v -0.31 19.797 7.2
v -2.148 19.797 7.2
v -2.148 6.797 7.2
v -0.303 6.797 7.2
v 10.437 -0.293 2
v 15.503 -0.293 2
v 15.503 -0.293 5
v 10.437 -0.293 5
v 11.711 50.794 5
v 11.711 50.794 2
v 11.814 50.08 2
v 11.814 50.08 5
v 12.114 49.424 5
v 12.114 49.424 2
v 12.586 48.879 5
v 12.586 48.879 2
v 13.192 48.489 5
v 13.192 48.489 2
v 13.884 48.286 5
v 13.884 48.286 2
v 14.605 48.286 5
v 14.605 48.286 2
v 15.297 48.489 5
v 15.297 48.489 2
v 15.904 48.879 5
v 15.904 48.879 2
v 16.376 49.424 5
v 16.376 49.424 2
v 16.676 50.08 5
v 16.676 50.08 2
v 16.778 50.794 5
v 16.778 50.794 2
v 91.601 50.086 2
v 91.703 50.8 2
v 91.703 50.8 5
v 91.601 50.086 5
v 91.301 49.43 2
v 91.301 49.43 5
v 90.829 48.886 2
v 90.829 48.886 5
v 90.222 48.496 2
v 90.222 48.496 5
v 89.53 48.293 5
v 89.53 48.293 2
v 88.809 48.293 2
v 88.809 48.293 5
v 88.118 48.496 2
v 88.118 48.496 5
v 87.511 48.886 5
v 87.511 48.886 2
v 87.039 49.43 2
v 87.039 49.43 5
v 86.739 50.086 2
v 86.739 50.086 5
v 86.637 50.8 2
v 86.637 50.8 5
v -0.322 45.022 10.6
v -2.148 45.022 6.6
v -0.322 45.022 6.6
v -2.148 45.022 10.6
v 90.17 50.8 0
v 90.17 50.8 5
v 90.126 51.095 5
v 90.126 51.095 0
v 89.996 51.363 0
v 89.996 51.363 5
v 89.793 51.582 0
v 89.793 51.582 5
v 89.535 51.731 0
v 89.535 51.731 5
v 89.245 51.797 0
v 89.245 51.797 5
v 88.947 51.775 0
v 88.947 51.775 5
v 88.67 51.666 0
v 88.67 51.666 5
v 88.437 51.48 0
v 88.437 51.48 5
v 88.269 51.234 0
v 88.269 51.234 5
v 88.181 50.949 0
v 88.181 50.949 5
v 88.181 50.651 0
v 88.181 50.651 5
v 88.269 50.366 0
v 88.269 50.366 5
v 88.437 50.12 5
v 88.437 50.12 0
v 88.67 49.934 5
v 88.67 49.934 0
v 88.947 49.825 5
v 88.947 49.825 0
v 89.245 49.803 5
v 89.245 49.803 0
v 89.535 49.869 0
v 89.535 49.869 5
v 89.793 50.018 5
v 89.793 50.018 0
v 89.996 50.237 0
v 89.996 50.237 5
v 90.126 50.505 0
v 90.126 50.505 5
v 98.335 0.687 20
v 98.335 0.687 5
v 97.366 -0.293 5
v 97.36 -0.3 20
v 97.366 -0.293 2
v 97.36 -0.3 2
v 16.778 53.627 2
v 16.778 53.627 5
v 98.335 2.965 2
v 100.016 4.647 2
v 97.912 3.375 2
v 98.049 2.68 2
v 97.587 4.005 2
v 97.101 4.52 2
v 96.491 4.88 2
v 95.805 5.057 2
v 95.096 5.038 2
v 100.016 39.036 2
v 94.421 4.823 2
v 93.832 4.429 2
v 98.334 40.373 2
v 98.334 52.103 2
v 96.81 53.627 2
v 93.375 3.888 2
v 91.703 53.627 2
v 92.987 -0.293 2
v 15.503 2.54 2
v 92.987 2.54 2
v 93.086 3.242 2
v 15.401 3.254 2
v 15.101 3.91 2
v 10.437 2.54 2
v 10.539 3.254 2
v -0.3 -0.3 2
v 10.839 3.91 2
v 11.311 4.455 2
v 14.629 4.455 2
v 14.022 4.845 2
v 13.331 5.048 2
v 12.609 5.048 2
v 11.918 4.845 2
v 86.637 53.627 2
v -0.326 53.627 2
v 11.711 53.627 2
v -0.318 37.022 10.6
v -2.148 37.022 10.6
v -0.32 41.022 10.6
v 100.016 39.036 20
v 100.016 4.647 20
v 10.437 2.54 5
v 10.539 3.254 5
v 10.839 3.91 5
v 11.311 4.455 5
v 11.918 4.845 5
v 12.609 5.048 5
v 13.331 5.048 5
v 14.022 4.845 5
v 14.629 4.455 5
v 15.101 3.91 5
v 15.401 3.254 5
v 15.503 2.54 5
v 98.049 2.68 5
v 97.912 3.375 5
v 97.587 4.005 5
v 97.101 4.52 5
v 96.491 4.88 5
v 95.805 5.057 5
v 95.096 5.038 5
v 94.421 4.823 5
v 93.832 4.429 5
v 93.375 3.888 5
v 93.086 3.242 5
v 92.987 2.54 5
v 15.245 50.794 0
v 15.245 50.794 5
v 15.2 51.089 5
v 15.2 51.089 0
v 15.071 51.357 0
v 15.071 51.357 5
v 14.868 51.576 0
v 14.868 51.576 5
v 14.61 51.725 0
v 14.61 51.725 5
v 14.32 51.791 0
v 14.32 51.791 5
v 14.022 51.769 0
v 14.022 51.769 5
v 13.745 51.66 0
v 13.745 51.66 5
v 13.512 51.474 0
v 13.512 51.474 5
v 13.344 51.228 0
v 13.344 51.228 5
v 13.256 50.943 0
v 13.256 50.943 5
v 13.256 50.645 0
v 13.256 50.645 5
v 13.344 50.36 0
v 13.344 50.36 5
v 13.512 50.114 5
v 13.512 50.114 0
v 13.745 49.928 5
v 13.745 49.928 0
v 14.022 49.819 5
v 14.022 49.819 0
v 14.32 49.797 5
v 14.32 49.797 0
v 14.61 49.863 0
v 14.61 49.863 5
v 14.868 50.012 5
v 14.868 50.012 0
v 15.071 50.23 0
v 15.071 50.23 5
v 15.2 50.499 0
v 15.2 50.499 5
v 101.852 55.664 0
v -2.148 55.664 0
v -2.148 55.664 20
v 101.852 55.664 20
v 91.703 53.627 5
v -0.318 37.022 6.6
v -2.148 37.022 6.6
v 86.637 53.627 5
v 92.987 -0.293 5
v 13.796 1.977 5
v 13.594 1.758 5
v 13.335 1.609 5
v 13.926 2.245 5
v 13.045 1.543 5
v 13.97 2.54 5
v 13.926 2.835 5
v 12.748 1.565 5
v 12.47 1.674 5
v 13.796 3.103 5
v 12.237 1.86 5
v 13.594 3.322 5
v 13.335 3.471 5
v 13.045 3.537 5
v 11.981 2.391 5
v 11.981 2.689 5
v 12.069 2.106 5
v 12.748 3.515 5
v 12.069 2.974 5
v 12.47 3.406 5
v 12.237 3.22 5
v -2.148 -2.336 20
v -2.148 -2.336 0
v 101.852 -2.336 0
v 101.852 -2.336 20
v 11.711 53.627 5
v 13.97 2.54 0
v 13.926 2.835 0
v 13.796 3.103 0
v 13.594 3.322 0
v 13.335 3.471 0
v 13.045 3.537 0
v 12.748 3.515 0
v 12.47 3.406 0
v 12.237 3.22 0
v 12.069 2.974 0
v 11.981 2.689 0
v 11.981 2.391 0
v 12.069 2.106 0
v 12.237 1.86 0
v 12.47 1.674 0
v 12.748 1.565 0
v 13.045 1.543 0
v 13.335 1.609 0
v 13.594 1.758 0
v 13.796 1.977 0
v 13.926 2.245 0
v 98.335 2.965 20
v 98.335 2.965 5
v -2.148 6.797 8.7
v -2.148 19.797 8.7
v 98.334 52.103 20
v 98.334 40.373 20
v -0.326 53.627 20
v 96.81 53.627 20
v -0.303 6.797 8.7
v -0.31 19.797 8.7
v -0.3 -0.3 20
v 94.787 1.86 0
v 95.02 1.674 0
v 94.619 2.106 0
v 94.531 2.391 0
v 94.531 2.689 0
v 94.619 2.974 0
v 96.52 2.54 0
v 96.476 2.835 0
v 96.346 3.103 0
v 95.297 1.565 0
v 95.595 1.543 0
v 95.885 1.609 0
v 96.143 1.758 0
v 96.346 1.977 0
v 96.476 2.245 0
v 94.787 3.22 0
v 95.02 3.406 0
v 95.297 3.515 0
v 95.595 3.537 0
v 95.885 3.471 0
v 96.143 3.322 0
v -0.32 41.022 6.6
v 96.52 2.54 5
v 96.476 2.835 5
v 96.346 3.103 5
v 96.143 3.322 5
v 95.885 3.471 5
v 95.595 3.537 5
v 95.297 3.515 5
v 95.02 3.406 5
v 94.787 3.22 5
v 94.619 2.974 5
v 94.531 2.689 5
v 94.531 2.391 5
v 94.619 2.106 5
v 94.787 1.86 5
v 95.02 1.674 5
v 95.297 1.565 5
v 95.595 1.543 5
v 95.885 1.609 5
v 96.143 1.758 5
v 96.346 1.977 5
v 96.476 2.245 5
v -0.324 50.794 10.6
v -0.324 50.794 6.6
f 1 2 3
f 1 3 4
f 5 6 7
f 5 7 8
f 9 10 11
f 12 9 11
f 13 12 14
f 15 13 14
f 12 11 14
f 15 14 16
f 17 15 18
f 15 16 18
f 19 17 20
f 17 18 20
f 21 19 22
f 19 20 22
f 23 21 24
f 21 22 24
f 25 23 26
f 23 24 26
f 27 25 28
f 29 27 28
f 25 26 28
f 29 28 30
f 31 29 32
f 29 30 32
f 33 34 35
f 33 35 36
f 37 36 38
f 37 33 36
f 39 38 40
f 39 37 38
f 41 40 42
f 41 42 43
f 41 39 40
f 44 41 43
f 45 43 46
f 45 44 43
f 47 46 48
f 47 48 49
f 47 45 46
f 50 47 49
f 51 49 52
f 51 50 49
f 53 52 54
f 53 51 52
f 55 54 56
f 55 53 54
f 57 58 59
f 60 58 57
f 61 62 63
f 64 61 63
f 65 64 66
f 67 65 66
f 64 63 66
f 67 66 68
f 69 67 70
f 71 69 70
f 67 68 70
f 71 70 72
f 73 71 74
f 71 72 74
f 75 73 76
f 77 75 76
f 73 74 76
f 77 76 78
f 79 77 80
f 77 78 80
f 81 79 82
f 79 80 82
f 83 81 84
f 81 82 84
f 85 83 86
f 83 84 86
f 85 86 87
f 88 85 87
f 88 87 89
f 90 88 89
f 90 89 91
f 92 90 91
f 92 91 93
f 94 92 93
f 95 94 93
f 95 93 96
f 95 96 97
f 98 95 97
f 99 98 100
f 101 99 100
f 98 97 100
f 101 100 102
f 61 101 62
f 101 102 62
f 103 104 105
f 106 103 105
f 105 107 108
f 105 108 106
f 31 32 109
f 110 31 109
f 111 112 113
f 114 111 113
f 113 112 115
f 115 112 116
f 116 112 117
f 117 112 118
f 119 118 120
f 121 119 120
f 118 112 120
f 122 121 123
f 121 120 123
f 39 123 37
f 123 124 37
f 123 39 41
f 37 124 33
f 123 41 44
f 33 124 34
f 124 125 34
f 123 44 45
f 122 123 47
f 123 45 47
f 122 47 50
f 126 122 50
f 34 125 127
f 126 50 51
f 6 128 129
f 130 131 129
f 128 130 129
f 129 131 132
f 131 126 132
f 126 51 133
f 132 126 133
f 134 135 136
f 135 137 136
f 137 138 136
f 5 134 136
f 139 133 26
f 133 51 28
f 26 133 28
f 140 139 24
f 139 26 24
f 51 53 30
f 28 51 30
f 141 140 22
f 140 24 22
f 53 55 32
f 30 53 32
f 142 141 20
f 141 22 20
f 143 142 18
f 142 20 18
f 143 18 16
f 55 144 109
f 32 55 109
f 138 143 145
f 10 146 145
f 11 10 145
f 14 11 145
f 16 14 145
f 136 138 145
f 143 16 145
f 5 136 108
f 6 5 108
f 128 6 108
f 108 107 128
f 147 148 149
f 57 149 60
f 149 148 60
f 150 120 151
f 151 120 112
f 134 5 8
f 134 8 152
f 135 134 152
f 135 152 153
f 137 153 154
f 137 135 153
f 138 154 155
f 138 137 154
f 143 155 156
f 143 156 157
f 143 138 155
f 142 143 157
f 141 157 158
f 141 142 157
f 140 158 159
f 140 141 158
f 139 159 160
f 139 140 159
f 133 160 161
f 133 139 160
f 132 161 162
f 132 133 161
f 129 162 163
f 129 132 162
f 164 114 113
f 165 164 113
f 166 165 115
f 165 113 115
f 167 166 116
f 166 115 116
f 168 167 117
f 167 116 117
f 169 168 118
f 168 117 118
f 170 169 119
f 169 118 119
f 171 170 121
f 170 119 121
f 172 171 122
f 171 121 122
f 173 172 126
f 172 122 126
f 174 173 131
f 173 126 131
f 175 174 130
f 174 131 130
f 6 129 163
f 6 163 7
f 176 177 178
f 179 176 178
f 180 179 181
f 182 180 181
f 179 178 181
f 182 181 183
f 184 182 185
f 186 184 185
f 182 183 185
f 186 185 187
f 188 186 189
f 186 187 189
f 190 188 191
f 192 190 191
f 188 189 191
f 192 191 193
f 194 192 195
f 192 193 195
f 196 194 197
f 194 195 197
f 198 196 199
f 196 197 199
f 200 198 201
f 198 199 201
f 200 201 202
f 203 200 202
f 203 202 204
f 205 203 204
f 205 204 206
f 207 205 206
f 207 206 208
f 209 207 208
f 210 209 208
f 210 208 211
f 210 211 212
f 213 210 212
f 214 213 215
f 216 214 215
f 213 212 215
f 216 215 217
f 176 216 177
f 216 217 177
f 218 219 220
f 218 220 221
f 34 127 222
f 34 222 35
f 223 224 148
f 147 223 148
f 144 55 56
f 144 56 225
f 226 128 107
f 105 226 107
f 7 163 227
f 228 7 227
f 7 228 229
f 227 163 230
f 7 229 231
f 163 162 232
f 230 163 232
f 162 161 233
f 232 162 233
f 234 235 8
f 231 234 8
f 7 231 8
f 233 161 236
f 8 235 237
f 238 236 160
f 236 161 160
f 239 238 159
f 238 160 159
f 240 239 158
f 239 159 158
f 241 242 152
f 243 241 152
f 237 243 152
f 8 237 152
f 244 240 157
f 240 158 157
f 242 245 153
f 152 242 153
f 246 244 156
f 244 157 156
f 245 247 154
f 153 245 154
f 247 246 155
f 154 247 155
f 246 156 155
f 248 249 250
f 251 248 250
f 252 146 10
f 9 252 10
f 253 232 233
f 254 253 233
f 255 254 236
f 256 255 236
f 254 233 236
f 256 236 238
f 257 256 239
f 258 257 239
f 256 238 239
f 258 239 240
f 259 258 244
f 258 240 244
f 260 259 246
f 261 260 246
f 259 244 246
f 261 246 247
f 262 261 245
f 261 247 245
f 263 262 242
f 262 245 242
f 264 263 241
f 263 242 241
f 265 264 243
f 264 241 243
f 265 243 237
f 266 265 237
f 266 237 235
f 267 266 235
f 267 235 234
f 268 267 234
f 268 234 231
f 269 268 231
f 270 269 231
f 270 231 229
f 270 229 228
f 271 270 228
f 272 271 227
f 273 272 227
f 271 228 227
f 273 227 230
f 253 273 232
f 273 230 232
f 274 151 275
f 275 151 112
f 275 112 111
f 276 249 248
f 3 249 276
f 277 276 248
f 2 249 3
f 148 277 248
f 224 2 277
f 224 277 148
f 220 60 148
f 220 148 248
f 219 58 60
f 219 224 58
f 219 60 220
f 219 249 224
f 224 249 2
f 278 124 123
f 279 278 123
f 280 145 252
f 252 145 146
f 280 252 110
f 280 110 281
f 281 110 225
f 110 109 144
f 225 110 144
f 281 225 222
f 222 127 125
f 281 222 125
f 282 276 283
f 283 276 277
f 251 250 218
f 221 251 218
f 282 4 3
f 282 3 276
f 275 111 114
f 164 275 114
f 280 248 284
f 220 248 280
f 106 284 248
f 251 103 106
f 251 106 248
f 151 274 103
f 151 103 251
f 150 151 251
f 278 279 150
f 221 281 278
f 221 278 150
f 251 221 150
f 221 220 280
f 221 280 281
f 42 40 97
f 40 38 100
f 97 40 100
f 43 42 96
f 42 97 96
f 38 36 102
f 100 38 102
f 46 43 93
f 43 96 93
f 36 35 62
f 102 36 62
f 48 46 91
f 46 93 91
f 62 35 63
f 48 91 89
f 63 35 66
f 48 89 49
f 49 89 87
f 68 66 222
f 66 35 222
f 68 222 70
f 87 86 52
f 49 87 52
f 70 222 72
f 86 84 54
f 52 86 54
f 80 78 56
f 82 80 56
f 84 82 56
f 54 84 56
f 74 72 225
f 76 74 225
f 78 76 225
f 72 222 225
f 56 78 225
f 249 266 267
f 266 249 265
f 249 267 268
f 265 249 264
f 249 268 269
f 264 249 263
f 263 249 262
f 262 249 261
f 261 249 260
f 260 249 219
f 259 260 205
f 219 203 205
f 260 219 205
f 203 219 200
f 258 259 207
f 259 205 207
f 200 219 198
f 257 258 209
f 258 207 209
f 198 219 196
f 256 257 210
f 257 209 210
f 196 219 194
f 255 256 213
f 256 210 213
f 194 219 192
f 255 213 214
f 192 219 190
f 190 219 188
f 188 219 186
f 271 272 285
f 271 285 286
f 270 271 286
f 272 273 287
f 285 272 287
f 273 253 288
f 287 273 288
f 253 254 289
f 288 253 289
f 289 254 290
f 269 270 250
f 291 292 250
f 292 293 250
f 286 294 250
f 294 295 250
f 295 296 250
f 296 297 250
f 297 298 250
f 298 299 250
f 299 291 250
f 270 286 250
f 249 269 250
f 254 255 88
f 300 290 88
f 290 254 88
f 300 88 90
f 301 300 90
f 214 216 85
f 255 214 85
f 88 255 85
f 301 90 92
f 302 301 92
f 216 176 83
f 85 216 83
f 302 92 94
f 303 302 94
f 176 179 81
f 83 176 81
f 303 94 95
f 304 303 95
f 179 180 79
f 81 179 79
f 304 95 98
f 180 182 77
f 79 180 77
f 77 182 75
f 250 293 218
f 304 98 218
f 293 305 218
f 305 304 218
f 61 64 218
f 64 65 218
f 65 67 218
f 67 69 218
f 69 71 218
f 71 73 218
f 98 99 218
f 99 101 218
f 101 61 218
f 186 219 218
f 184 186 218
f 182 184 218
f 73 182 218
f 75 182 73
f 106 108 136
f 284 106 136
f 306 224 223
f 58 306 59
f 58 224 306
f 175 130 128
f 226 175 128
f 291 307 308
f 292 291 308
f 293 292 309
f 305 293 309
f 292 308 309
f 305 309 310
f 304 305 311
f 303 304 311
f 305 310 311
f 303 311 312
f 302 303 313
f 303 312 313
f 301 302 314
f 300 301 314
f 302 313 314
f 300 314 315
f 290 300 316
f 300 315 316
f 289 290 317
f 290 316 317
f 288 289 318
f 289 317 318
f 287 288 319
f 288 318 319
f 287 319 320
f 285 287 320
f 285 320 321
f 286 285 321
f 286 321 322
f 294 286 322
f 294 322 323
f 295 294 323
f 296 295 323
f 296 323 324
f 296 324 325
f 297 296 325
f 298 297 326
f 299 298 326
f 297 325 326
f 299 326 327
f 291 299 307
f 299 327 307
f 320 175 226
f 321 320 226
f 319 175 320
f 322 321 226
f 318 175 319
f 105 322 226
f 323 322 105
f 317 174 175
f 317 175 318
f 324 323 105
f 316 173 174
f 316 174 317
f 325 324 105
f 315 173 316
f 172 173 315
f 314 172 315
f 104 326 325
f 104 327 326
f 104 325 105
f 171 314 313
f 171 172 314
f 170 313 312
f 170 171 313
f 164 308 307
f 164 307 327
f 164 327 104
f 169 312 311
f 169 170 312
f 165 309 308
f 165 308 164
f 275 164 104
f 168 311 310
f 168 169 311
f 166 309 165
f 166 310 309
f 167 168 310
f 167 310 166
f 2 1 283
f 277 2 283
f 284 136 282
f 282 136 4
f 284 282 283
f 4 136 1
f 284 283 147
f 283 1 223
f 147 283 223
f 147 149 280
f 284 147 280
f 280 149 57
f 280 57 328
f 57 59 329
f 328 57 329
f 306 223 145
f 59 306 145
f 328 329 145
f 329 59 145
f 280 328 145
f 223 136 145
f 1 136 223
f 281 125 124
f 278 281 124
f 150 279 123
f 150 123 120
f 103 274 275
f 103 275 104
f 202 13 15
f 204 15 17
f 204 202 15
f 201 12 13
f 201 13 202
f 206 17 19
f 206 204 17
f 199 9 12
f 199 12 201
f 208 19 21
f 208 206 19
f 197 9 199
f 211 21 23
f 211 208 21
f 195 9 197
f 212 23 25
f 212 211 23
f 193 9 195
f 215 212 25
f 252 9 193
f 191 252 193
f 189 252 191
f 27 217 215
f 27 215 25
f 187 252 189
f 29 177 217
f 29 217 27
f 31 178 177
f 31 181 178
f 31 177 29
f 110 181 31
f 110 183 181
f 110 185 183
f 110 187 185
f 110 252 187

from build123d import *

# Parameters (mm, degrees)
SKETCH_3_W               = 104
SKETCH_3_H               = 58
EXTRUDE_1_DEPTH          = 20
SKETCH_3_R               = 1.5
EXTRUDE_1_2_DEPTH        = 20
EXTRUDE_1_3_DEPTH        = 20
EXTRUDE_1_4_DEPTH        = 20
EXTRUDE_1_5_DEPTH        = 20
SKETCH_4_W               = 104
SKETCH_4_H               = 58
EXTRUDE_2_DEPTH          = 2
EXTRUDE_3_DEPTH          = 3
CUT_EXTRUDE_1_DEPTH      = 118.034964822
CUT_EXTRUDE_1_DEPTH_BACK = 118.034964822
SKETCH_6_R               = 1.5
SKETCH_7_R               = 1.6263635
SKETCH_7_R_2             = 1
EXTRUDE_4_DEPTH          = 5
SKETCH_8_W               = 4
SKETCH_8_H               = 10
CUT_EXTRUDE_2_DEPTH      = 1.274832
SKETCH_9_W               = 4
SKETCH_9_H               = 8
EXTRUDE_5_DEPTH          = 4
SKETCH_11_W              = 4
SKETCH_11_H              = 5.77137
EXTRUDE_7_DEPTH          = 1.82408674
CUT_EXTRUDE_3_REACH      = 123.535
SKETCH_13_W              = 4
SKETCH_13_H              = 8
SKETCH_14_W              = 2
SKETCH_14_H              = 13
EXTRUDE_8_DEPTH          = 2.2
CUT_EXTRUDE_4_REACH      = 123.385
SKETCH_15_W              = 1.5
SKETCH_15_H              = 13
SKETCH_16_W              = 7.456454352
SKETCH_16_H              = 15.223594302
CUT_EXTRUDE_5_DEPTH      = 2


with BuildPart() as part:
    # 草图3 → 凸台-拉伸1 (new body)
    with BuildSketch(Plane.XY):
        with Locations((49.851592, 26.6635985)):
            Rectangle(SKETCH_3_W, SKETCH_3_H)
        Polygon((97.359934, -0.3), (-0.3, -0.3), (-0.32567, 53.627197), (96.810253, 53.627197), (98.334256, 52.103194), (98.334256, 40.373171), (100.016019, 39.036416919), (100.016019, 4.64681), (98.334516, 2.965177), (98.334516, 0.686792), align=None, mode=Mode.SUBTRACT)
    extrude(amount=EXTRUDE_1_DEPTH)



with BuildPart() as body_2:
    # 草图3 → Extrude 1 2 (new body)
    with BuildSketch(Plane.XY):
        with Locations((89.1699285, 50.800132)):
            Circle(SKETCH_3_R)
    extrude(amount=EXTRUDE_1_2_DEPTH)


with BuildPart() as body_3:
    # 草图3 → Extrude 1 3 (new body)
    with BuildSketch(Plane.XY):
        with Locations((95.519941, 2.540035)):
            Circle(SKETCH_3_R)
    extrude(amount=EXTRUDE_1_3_DEPTH)


with BuildPart() as body_4:
    # 草图3 → Extrude 1 4 (new body)
    with BuildSketch(Plane.XY):
        with Locations((12.970026, 2.540035)):
            Circle(SKETCH_3_R)
    extrude(amount=EXTRUDE_1_4_DEPTH)


with BuildPart() as body_5:
    # 草图3 → Extrude 1 5 (new body)
    with BuildSketch(Plane.XY):
        with Locations((14.2448585, 50.793782)):
            Circle(SKETCH_3_R)
    extrude(amount=EXTRUDE_1_5_DEPTH)


with BuildPart() as part_1:
    add(part.part)

    add(body_2.part)  # 凸台-拉伸2 merges body 2

    add(body_3.part)  # 凸台-拉伸2 merges body 3

    add(body_4.part)  # 凸台-拉伸2 merges body 4

    add(body_5.part)  # 凸台-拉伸2 merges body 5
    # 草图4 → 凸台-拉伸2 (add)
    with BuildSketch(Plane(origin=(0, 0, 0), x_dir=(-1, 0, 0), z_dir=(0, 0, -1))):
        with Locations((-49.851592, 26.6635985)):
            Rectangle(SKETCH_4_W, SKETCH_4_H)
    extrude(amount=-EXTRUDE_2_DEPTH)

    # 草图5 → 凸台-拉伸3 (add)
    with BuildSketch(Plane.XY.offset(2)):
        with BuildLine():
            Line((16.7782735, 50.793782), (16.7782735, 53.627197))
            Line((16.7782735, 53.627197), (11.7114435, 53.627197))
            Line((11.7114435, 53.627197), (11.7114435, 50.793782))
            ThreePointArc((11.7114435, 50.793782), (14.2448585, 48.260367), (16.7782735, 50.793782))
        make_face()
        with BuildLine():
            Line((86.6365135, 50.800132), (86.6365135, 53.633547))
            Line((86.6365135, 53.633547), (91.7033435, 53.633547))
            Line((91.7033435, 53.633547), (91.7033435, 50.800132))
            ThreePointArc((91.7033435, 50.800132), (89.1699285, 48.266717), (86.6365135, 50.800132))
        make_face()
        with BuildLine():
            Line((15.503441, 2.540035), (15.503441, -0.29338))
            Line((15.503441, -0.29338), (10.436611, -0.29338))
            Line((10.436611, -0.29338), (10.436611, 2.540035))
            ThreePointArc((10.436611, 2.540035), (12.970026, 5.07345), (15.503441, 2.540035))
        make_face()
        with BuildLine():
            Line((92.986526, -0.29338), (98.053356, -0.29338))
            Line((98.053356, -0.29338), (98.605799849, -0.29338))
            Line((98.605799849, -0.29338), (100.016019, 4.64681))
            Line((100.016019, 4.64681), (98.334516, 2.965177))
            Line((98.334516, 2.965177), (98.049480092, 2.680119056))
            ThreePointArc((98.049480092, 2.680119056), (95.449872167, 5.072480838), (92.986526, 2.540035))
            Line((92.986526, 2.540035), (92.986526, -0.29338))
        make_face()
    extrude(amount=EXTRUDE_3_DEPTH)

    # 草图6 → 切除-拉伸1 (cut, two sides: drawn at the far end of the back side and taken through both)
    with BuildSketch(Plane.XY.offset(5).offset(-CUT_EXTRUDE_1_DEPTH_BACK)):
        with Locations((14.2448585, 50.793782)):
            Circle(SKETCH_6_R)
        with Locations((89.1699285, 50.800132)):
            Circle(SKETCH_6_R)
        with Locations((12.970026, 2.540035)):
            Circle(SKETCH_6_R)
        with Locations((95.519941, 2.540035)):
            Circle(SKETCH_6_R)
    extrude(amount=CUT_EXTRUDE_1_DEPTH + CUT_EXTRUDE_1_DEPTH_BACK, mode=Mode.SUBTRACT)

    # 草图7 → 凸台-拉伸4 (add)
    # profile 1 of 4: a face of its own
    with BuildSketch(Plane.XY.offset(5)):
        with Locations((14.2448585, 50.793782)):
            Circle(SKETCH_7_R)
        with Locations((14.2448585, 50.793782)):
            Circle(SKETCH_7_R_2, mode=Mode.SUBTRACT)
    # profile 2 of 4: a face of its own
    with BuildSketch(Plane.XY.offset(5)):
        with Locations((89.1699285, 50.800132)):
            Circle(SKETCH_7_R)
        with Locations((89.1699285, 50.800132)):
            Circle(SKETCH_7_R_2, mode=Mode.SUBTRACT)
    # profile 3 of 4: a face of its own
    with BuildSketch(Plane.XY.offset(5)):
        with Locations((95.519941, 2.540035)):
            Circle(SKETCH_7_R)
        with Locations((95.519941, 2.540035)):
            Circle(SKETCH_7_R_2, mode=Mode.SUBTRACT)
    # profile 4 of 4: a face of its own
    with BuildSketch(Plane.XY.offset(5)):
        with Locations((12.970026, 2.540035)):
            Circle(SKETCH_7_R)
        with Locations((12.970026, 2.540035)):
            Circle(SKETCH_7_R_2, mode=Mode.SUBTRACT)
    extrude(amount=-EXTRUDE_4_DEPTH)

    # 草图8 → 切除-拉伸2 (cut)
    with BuildSketch(Plane(origin=(16.7782735, 0, 0), x_dir=(0, 0, -1), z_dir=(1, 0, 0))):
        with Locations((-8.6, 45.793782)):
            Rectangle(SKETCH_8_W, SKETCH_8_H)
    extrude(amount=-CUT_EXTRUDE_2_DEPTH, mode=Mode.SUBTRACT)

    # 草图9 → 凸台-拉伸5 (add)
    with BuildSketch(Plane.XY.offset(6.6)):
        with Locations((-2.319669969, 41.022412)):
            Rectangle(SKETCH_9_W, SKETCH_9_H)
    extrude(amount=EXTRUDE_5_DEPTH)

    # 草图11 → 凸台-拉伸7 (add)
    with BuildSketch(Plane.ZY.offset(2.148408)):
        with Locations((8.6, 47.908097)):
            Rectangle(SKETCH_11_W, SKETCH_11_H)
    extrude(amount=-EXTRUDE_7_DEPTH)

    # 切除-拉伸3: up to this plane
    cut_extrude_3_end = Plane(origin=(-0.300142736, -0.000142872, 20), z_dir=(-0.9999998867062445, -0.00047601207776012256, 0))
    # 草图13 → 切除-拉伸3 (cut, up to the surface)
    with BuildSketch(Plane.ZY.offset(4.319669969), mode=Mode.PRIVATE) as cut_extrude_3_sk1:
        with Locations((8.6, 41.022412)):
            Rectangle(SKETCH_13_W, SKETCH_13_H)
    cut_extrude_3_tool1 = split(extrude(cut_extrude_3_sk1.sketch, amount=-CUT_EXTRUDE_3_REACH, mode=Mode.PRIVATE), bisect_by=cut_extrude_3_end, keep=Keep.BOTH, mode=Mode.PRIVATE)
    add(cut_extrude_3_tool1.solids().sort_by_distance((-4.31967, 41.022412, 8.6))[0], mode=Mode.SUBTRACT)


with BuildPart() as cut_extrude_3_kept_piece:
    # of the separate pieces the step leaves, the one the design keeps (cut_extrude_3_pieces_kept)
    add(part_1.part.solids().sort_by_distance((-2.148408, -2.3364015, 0))[0])

    # 草图14 → 凸台-拉伸8 (add)
    with BuildSketch(Plane.XY.offset(5)):
        with Locations((-3.148408, 13.296995)):
            Rectangle(SKETCH_14_W, SKETCH_14_H)
    extrude(amount=EXTRUDE_8_DEPTH)

    # 切除-拉伸4: up to this plane
    cut_extrude_4_end = Plane(origin=(-0.300142736, -0.000142872, 20), z_dir=(-0.9999998867062445, -0.00047601207776012256, 0))
    # 草图15 → 切除-拉伸4 (cut, up to the surface)
    with BuildSketch(Plane.ZY.offset(4.148408), mode=Mode.PRIVATE) as cut_extrude_4_sk1:
        with Locations((7.95, 13.296995)):
            Rectangle(SKETCH_15_W, SKETCH_15_H)
    cut_extrude_4_tool1 = split(extrude(cut_extrude_4_sk1.sketch, amount=-CUT_EXTRUDE_4_REACH, mode=Mode.PRIVATE), bisect_by=cut_extrude_4_end, keep=Keep.BOTH, mode=Mode.PRIVATE)
    add(cut_extrude_4_tool1.solids().sort_by_distance((-4.148408, 13.296995, 7.95))[0], mode=Mode.SUBTRACT)

    # 草图16 → 切除-拉伸5 (cut)
    with BuildSketch(Plane.ZY.offset(2.148408)):
        with Locations((6.989585085, 13.226446387)):
            Rectangle(SKETCH_16_W, SKETCH_16_H)
    extrude(amount=CUT_EXTRUDE_5_DEPTH, mode=Mode.SUBTRACT)


solid = cut_extrude_3_kept_piece.part
